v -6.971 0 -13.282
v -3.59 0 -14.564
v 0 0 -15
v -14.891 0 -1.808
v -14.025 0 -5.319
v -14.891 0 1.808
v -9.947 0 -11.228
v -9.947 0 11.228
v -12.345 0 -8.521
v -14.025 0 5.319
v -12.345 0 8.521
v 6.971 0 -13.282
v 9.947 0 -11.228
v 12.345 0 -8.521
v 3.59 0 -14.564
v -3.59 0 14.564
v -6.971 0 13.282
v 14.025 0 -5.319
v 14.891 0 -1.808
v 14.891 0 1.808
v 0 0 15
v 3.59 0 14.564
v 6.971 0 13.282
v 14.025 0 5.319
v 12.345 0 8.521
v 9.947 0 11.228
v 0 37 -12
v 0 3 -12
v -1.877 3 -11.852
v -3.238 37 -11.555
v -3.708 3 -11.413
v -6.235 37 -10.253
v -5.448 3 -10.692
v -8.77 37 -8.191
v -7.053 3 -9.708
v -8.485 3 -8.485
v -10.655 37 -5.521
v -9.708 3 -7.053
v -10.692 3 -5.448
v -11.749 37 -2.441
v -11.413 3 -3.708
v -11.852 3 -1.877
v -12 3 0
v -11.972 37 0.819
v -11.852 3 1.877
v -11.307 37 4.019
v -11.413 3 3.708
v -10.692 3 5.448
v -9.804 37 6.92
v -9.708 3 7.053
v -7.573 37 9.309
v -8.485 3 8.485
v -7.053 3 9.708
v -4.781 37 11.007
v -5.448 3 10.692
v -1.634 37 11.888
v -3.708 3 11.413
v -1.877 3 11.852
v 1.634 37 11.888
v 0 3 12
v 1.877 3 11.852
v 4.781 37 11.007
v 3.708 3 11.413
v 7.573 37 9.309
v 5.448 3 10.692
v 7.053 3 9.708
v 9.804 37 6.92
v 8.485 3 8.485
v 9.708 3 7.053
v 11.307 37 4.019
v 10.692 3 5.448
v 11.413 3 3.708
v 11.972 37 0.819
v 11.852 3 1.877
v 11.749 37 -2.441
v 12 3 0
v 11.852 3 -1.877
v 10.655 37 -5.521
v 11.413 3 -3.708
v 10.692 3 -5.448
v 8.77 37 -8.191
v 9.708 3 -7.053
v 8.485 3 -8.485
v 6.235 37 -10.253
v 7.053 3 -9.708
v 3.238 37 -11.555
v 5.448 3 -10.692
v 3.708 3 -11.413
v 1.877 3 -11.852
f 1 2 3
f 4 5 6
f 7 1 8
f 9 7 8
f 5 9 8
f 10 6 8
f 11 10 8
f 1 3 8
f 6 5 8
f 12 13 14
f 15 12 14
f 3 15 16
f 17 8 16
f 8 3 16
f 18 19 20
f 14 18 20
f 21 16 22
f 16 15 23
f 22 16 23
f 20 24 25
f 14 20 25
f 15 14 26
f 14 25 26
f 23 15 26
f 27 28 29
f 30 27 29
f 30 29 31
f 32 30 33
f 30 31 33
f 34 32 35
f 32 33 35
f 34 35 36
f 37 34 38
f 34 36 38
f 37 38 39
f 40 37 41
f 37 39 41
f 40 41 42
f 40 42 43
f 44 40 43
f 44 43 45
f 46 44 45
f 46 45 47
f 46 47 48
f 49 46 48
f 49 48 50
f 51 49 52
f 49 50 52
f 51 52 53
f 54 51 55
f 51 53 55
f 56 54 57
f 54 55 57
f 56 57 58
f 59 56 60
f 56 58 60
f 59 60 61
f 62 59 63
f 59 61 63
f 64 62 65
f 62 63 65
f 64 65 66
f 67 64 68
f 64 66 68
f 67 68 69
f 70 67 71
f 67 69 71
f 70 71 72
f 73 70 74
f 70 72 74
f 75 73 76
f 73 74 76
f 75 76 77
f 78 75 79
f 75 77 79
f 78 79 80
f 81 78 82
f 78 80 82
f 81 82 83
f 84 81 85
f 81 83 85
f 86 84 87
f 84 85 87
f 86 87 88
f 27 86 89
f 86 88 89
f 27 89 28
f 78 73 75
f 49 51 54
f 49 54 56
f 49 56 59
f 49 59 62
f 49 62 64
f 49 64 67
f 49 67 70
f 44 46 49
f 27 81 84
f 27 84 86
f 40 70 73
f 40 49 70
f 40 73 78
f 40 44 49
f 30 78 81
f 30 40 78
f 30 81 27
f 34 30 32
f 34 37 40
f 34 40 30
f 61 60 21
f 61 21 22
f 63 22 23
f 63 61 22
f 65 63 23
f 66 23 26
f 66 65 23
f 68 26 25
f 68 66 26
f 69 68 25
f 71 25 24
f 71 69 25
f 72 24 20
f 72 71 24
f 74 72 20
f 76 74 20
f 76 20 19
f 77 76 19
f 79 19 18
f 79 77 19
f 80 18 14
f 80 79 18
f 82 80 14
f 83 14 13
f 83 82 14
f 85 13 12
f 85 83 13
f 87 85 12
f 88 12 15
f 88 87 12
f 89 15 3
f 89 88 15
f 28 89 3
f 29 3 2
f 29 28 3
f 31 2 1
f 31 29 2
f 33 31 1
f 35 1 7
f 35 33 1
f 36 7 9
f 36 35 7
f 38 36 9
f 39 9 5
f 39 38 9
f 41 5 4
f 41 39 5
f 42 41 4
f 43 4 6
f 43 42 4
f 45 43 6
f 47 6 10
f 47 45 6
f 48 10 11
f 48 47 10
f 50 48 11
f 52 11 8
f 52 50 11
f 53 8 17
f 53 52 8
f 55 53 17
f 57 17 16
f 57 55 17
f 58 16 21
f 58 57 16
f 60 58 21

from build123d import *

# Parameters (mm, degrees)
ESQUISSE1_R        = 15
BOSS_EXTRU_1_DEPTH = 3
CHANFREIN1_SIZE    = 3
ESQUISSE2_R        = 12
BOSS_EXTRU_2_DEPTH = 34


with BuildPart() as part:
    # Esquisse1 → Boss.-Extru.1 (new body)
    with BuildSketch(Plane(origin=(0, 0, 0), x_dir=(1, 0, 0), z_dir=(0, 1, 0))):
        with Locations(Location((0, 0, 0), (0, 0, 270))):
            Circle(ESQUISSE1_R)
    extrude(amount=BOSS_EXTRU_1_DEPTH)

    # Chanfrein1
    chanfrein1_edges = [part.edges().sort_by_distance(p)[0] for p in [
        (0, 3, -15),
    ]]
    chamfer(chanfrein1_edges, length=CHANFREIN1_SIZE - 0.0001)  # a hair under: the kernel refuses the full size

    # Esquisse2 → Boss.-Extru.2 (add)
    with BuildSketch(Plane(origin=(0, 3, 0), x_dir=(1, 0, 0), z_dir=(0, 1, 0))):
        with Locations(Location((0, 0, 0), (0, 0, 90))):
            Circle(ESQUISSE2_R)
    extrude(amount=BOSS_EXTRU_2_DEPTH)


solid = part.part
